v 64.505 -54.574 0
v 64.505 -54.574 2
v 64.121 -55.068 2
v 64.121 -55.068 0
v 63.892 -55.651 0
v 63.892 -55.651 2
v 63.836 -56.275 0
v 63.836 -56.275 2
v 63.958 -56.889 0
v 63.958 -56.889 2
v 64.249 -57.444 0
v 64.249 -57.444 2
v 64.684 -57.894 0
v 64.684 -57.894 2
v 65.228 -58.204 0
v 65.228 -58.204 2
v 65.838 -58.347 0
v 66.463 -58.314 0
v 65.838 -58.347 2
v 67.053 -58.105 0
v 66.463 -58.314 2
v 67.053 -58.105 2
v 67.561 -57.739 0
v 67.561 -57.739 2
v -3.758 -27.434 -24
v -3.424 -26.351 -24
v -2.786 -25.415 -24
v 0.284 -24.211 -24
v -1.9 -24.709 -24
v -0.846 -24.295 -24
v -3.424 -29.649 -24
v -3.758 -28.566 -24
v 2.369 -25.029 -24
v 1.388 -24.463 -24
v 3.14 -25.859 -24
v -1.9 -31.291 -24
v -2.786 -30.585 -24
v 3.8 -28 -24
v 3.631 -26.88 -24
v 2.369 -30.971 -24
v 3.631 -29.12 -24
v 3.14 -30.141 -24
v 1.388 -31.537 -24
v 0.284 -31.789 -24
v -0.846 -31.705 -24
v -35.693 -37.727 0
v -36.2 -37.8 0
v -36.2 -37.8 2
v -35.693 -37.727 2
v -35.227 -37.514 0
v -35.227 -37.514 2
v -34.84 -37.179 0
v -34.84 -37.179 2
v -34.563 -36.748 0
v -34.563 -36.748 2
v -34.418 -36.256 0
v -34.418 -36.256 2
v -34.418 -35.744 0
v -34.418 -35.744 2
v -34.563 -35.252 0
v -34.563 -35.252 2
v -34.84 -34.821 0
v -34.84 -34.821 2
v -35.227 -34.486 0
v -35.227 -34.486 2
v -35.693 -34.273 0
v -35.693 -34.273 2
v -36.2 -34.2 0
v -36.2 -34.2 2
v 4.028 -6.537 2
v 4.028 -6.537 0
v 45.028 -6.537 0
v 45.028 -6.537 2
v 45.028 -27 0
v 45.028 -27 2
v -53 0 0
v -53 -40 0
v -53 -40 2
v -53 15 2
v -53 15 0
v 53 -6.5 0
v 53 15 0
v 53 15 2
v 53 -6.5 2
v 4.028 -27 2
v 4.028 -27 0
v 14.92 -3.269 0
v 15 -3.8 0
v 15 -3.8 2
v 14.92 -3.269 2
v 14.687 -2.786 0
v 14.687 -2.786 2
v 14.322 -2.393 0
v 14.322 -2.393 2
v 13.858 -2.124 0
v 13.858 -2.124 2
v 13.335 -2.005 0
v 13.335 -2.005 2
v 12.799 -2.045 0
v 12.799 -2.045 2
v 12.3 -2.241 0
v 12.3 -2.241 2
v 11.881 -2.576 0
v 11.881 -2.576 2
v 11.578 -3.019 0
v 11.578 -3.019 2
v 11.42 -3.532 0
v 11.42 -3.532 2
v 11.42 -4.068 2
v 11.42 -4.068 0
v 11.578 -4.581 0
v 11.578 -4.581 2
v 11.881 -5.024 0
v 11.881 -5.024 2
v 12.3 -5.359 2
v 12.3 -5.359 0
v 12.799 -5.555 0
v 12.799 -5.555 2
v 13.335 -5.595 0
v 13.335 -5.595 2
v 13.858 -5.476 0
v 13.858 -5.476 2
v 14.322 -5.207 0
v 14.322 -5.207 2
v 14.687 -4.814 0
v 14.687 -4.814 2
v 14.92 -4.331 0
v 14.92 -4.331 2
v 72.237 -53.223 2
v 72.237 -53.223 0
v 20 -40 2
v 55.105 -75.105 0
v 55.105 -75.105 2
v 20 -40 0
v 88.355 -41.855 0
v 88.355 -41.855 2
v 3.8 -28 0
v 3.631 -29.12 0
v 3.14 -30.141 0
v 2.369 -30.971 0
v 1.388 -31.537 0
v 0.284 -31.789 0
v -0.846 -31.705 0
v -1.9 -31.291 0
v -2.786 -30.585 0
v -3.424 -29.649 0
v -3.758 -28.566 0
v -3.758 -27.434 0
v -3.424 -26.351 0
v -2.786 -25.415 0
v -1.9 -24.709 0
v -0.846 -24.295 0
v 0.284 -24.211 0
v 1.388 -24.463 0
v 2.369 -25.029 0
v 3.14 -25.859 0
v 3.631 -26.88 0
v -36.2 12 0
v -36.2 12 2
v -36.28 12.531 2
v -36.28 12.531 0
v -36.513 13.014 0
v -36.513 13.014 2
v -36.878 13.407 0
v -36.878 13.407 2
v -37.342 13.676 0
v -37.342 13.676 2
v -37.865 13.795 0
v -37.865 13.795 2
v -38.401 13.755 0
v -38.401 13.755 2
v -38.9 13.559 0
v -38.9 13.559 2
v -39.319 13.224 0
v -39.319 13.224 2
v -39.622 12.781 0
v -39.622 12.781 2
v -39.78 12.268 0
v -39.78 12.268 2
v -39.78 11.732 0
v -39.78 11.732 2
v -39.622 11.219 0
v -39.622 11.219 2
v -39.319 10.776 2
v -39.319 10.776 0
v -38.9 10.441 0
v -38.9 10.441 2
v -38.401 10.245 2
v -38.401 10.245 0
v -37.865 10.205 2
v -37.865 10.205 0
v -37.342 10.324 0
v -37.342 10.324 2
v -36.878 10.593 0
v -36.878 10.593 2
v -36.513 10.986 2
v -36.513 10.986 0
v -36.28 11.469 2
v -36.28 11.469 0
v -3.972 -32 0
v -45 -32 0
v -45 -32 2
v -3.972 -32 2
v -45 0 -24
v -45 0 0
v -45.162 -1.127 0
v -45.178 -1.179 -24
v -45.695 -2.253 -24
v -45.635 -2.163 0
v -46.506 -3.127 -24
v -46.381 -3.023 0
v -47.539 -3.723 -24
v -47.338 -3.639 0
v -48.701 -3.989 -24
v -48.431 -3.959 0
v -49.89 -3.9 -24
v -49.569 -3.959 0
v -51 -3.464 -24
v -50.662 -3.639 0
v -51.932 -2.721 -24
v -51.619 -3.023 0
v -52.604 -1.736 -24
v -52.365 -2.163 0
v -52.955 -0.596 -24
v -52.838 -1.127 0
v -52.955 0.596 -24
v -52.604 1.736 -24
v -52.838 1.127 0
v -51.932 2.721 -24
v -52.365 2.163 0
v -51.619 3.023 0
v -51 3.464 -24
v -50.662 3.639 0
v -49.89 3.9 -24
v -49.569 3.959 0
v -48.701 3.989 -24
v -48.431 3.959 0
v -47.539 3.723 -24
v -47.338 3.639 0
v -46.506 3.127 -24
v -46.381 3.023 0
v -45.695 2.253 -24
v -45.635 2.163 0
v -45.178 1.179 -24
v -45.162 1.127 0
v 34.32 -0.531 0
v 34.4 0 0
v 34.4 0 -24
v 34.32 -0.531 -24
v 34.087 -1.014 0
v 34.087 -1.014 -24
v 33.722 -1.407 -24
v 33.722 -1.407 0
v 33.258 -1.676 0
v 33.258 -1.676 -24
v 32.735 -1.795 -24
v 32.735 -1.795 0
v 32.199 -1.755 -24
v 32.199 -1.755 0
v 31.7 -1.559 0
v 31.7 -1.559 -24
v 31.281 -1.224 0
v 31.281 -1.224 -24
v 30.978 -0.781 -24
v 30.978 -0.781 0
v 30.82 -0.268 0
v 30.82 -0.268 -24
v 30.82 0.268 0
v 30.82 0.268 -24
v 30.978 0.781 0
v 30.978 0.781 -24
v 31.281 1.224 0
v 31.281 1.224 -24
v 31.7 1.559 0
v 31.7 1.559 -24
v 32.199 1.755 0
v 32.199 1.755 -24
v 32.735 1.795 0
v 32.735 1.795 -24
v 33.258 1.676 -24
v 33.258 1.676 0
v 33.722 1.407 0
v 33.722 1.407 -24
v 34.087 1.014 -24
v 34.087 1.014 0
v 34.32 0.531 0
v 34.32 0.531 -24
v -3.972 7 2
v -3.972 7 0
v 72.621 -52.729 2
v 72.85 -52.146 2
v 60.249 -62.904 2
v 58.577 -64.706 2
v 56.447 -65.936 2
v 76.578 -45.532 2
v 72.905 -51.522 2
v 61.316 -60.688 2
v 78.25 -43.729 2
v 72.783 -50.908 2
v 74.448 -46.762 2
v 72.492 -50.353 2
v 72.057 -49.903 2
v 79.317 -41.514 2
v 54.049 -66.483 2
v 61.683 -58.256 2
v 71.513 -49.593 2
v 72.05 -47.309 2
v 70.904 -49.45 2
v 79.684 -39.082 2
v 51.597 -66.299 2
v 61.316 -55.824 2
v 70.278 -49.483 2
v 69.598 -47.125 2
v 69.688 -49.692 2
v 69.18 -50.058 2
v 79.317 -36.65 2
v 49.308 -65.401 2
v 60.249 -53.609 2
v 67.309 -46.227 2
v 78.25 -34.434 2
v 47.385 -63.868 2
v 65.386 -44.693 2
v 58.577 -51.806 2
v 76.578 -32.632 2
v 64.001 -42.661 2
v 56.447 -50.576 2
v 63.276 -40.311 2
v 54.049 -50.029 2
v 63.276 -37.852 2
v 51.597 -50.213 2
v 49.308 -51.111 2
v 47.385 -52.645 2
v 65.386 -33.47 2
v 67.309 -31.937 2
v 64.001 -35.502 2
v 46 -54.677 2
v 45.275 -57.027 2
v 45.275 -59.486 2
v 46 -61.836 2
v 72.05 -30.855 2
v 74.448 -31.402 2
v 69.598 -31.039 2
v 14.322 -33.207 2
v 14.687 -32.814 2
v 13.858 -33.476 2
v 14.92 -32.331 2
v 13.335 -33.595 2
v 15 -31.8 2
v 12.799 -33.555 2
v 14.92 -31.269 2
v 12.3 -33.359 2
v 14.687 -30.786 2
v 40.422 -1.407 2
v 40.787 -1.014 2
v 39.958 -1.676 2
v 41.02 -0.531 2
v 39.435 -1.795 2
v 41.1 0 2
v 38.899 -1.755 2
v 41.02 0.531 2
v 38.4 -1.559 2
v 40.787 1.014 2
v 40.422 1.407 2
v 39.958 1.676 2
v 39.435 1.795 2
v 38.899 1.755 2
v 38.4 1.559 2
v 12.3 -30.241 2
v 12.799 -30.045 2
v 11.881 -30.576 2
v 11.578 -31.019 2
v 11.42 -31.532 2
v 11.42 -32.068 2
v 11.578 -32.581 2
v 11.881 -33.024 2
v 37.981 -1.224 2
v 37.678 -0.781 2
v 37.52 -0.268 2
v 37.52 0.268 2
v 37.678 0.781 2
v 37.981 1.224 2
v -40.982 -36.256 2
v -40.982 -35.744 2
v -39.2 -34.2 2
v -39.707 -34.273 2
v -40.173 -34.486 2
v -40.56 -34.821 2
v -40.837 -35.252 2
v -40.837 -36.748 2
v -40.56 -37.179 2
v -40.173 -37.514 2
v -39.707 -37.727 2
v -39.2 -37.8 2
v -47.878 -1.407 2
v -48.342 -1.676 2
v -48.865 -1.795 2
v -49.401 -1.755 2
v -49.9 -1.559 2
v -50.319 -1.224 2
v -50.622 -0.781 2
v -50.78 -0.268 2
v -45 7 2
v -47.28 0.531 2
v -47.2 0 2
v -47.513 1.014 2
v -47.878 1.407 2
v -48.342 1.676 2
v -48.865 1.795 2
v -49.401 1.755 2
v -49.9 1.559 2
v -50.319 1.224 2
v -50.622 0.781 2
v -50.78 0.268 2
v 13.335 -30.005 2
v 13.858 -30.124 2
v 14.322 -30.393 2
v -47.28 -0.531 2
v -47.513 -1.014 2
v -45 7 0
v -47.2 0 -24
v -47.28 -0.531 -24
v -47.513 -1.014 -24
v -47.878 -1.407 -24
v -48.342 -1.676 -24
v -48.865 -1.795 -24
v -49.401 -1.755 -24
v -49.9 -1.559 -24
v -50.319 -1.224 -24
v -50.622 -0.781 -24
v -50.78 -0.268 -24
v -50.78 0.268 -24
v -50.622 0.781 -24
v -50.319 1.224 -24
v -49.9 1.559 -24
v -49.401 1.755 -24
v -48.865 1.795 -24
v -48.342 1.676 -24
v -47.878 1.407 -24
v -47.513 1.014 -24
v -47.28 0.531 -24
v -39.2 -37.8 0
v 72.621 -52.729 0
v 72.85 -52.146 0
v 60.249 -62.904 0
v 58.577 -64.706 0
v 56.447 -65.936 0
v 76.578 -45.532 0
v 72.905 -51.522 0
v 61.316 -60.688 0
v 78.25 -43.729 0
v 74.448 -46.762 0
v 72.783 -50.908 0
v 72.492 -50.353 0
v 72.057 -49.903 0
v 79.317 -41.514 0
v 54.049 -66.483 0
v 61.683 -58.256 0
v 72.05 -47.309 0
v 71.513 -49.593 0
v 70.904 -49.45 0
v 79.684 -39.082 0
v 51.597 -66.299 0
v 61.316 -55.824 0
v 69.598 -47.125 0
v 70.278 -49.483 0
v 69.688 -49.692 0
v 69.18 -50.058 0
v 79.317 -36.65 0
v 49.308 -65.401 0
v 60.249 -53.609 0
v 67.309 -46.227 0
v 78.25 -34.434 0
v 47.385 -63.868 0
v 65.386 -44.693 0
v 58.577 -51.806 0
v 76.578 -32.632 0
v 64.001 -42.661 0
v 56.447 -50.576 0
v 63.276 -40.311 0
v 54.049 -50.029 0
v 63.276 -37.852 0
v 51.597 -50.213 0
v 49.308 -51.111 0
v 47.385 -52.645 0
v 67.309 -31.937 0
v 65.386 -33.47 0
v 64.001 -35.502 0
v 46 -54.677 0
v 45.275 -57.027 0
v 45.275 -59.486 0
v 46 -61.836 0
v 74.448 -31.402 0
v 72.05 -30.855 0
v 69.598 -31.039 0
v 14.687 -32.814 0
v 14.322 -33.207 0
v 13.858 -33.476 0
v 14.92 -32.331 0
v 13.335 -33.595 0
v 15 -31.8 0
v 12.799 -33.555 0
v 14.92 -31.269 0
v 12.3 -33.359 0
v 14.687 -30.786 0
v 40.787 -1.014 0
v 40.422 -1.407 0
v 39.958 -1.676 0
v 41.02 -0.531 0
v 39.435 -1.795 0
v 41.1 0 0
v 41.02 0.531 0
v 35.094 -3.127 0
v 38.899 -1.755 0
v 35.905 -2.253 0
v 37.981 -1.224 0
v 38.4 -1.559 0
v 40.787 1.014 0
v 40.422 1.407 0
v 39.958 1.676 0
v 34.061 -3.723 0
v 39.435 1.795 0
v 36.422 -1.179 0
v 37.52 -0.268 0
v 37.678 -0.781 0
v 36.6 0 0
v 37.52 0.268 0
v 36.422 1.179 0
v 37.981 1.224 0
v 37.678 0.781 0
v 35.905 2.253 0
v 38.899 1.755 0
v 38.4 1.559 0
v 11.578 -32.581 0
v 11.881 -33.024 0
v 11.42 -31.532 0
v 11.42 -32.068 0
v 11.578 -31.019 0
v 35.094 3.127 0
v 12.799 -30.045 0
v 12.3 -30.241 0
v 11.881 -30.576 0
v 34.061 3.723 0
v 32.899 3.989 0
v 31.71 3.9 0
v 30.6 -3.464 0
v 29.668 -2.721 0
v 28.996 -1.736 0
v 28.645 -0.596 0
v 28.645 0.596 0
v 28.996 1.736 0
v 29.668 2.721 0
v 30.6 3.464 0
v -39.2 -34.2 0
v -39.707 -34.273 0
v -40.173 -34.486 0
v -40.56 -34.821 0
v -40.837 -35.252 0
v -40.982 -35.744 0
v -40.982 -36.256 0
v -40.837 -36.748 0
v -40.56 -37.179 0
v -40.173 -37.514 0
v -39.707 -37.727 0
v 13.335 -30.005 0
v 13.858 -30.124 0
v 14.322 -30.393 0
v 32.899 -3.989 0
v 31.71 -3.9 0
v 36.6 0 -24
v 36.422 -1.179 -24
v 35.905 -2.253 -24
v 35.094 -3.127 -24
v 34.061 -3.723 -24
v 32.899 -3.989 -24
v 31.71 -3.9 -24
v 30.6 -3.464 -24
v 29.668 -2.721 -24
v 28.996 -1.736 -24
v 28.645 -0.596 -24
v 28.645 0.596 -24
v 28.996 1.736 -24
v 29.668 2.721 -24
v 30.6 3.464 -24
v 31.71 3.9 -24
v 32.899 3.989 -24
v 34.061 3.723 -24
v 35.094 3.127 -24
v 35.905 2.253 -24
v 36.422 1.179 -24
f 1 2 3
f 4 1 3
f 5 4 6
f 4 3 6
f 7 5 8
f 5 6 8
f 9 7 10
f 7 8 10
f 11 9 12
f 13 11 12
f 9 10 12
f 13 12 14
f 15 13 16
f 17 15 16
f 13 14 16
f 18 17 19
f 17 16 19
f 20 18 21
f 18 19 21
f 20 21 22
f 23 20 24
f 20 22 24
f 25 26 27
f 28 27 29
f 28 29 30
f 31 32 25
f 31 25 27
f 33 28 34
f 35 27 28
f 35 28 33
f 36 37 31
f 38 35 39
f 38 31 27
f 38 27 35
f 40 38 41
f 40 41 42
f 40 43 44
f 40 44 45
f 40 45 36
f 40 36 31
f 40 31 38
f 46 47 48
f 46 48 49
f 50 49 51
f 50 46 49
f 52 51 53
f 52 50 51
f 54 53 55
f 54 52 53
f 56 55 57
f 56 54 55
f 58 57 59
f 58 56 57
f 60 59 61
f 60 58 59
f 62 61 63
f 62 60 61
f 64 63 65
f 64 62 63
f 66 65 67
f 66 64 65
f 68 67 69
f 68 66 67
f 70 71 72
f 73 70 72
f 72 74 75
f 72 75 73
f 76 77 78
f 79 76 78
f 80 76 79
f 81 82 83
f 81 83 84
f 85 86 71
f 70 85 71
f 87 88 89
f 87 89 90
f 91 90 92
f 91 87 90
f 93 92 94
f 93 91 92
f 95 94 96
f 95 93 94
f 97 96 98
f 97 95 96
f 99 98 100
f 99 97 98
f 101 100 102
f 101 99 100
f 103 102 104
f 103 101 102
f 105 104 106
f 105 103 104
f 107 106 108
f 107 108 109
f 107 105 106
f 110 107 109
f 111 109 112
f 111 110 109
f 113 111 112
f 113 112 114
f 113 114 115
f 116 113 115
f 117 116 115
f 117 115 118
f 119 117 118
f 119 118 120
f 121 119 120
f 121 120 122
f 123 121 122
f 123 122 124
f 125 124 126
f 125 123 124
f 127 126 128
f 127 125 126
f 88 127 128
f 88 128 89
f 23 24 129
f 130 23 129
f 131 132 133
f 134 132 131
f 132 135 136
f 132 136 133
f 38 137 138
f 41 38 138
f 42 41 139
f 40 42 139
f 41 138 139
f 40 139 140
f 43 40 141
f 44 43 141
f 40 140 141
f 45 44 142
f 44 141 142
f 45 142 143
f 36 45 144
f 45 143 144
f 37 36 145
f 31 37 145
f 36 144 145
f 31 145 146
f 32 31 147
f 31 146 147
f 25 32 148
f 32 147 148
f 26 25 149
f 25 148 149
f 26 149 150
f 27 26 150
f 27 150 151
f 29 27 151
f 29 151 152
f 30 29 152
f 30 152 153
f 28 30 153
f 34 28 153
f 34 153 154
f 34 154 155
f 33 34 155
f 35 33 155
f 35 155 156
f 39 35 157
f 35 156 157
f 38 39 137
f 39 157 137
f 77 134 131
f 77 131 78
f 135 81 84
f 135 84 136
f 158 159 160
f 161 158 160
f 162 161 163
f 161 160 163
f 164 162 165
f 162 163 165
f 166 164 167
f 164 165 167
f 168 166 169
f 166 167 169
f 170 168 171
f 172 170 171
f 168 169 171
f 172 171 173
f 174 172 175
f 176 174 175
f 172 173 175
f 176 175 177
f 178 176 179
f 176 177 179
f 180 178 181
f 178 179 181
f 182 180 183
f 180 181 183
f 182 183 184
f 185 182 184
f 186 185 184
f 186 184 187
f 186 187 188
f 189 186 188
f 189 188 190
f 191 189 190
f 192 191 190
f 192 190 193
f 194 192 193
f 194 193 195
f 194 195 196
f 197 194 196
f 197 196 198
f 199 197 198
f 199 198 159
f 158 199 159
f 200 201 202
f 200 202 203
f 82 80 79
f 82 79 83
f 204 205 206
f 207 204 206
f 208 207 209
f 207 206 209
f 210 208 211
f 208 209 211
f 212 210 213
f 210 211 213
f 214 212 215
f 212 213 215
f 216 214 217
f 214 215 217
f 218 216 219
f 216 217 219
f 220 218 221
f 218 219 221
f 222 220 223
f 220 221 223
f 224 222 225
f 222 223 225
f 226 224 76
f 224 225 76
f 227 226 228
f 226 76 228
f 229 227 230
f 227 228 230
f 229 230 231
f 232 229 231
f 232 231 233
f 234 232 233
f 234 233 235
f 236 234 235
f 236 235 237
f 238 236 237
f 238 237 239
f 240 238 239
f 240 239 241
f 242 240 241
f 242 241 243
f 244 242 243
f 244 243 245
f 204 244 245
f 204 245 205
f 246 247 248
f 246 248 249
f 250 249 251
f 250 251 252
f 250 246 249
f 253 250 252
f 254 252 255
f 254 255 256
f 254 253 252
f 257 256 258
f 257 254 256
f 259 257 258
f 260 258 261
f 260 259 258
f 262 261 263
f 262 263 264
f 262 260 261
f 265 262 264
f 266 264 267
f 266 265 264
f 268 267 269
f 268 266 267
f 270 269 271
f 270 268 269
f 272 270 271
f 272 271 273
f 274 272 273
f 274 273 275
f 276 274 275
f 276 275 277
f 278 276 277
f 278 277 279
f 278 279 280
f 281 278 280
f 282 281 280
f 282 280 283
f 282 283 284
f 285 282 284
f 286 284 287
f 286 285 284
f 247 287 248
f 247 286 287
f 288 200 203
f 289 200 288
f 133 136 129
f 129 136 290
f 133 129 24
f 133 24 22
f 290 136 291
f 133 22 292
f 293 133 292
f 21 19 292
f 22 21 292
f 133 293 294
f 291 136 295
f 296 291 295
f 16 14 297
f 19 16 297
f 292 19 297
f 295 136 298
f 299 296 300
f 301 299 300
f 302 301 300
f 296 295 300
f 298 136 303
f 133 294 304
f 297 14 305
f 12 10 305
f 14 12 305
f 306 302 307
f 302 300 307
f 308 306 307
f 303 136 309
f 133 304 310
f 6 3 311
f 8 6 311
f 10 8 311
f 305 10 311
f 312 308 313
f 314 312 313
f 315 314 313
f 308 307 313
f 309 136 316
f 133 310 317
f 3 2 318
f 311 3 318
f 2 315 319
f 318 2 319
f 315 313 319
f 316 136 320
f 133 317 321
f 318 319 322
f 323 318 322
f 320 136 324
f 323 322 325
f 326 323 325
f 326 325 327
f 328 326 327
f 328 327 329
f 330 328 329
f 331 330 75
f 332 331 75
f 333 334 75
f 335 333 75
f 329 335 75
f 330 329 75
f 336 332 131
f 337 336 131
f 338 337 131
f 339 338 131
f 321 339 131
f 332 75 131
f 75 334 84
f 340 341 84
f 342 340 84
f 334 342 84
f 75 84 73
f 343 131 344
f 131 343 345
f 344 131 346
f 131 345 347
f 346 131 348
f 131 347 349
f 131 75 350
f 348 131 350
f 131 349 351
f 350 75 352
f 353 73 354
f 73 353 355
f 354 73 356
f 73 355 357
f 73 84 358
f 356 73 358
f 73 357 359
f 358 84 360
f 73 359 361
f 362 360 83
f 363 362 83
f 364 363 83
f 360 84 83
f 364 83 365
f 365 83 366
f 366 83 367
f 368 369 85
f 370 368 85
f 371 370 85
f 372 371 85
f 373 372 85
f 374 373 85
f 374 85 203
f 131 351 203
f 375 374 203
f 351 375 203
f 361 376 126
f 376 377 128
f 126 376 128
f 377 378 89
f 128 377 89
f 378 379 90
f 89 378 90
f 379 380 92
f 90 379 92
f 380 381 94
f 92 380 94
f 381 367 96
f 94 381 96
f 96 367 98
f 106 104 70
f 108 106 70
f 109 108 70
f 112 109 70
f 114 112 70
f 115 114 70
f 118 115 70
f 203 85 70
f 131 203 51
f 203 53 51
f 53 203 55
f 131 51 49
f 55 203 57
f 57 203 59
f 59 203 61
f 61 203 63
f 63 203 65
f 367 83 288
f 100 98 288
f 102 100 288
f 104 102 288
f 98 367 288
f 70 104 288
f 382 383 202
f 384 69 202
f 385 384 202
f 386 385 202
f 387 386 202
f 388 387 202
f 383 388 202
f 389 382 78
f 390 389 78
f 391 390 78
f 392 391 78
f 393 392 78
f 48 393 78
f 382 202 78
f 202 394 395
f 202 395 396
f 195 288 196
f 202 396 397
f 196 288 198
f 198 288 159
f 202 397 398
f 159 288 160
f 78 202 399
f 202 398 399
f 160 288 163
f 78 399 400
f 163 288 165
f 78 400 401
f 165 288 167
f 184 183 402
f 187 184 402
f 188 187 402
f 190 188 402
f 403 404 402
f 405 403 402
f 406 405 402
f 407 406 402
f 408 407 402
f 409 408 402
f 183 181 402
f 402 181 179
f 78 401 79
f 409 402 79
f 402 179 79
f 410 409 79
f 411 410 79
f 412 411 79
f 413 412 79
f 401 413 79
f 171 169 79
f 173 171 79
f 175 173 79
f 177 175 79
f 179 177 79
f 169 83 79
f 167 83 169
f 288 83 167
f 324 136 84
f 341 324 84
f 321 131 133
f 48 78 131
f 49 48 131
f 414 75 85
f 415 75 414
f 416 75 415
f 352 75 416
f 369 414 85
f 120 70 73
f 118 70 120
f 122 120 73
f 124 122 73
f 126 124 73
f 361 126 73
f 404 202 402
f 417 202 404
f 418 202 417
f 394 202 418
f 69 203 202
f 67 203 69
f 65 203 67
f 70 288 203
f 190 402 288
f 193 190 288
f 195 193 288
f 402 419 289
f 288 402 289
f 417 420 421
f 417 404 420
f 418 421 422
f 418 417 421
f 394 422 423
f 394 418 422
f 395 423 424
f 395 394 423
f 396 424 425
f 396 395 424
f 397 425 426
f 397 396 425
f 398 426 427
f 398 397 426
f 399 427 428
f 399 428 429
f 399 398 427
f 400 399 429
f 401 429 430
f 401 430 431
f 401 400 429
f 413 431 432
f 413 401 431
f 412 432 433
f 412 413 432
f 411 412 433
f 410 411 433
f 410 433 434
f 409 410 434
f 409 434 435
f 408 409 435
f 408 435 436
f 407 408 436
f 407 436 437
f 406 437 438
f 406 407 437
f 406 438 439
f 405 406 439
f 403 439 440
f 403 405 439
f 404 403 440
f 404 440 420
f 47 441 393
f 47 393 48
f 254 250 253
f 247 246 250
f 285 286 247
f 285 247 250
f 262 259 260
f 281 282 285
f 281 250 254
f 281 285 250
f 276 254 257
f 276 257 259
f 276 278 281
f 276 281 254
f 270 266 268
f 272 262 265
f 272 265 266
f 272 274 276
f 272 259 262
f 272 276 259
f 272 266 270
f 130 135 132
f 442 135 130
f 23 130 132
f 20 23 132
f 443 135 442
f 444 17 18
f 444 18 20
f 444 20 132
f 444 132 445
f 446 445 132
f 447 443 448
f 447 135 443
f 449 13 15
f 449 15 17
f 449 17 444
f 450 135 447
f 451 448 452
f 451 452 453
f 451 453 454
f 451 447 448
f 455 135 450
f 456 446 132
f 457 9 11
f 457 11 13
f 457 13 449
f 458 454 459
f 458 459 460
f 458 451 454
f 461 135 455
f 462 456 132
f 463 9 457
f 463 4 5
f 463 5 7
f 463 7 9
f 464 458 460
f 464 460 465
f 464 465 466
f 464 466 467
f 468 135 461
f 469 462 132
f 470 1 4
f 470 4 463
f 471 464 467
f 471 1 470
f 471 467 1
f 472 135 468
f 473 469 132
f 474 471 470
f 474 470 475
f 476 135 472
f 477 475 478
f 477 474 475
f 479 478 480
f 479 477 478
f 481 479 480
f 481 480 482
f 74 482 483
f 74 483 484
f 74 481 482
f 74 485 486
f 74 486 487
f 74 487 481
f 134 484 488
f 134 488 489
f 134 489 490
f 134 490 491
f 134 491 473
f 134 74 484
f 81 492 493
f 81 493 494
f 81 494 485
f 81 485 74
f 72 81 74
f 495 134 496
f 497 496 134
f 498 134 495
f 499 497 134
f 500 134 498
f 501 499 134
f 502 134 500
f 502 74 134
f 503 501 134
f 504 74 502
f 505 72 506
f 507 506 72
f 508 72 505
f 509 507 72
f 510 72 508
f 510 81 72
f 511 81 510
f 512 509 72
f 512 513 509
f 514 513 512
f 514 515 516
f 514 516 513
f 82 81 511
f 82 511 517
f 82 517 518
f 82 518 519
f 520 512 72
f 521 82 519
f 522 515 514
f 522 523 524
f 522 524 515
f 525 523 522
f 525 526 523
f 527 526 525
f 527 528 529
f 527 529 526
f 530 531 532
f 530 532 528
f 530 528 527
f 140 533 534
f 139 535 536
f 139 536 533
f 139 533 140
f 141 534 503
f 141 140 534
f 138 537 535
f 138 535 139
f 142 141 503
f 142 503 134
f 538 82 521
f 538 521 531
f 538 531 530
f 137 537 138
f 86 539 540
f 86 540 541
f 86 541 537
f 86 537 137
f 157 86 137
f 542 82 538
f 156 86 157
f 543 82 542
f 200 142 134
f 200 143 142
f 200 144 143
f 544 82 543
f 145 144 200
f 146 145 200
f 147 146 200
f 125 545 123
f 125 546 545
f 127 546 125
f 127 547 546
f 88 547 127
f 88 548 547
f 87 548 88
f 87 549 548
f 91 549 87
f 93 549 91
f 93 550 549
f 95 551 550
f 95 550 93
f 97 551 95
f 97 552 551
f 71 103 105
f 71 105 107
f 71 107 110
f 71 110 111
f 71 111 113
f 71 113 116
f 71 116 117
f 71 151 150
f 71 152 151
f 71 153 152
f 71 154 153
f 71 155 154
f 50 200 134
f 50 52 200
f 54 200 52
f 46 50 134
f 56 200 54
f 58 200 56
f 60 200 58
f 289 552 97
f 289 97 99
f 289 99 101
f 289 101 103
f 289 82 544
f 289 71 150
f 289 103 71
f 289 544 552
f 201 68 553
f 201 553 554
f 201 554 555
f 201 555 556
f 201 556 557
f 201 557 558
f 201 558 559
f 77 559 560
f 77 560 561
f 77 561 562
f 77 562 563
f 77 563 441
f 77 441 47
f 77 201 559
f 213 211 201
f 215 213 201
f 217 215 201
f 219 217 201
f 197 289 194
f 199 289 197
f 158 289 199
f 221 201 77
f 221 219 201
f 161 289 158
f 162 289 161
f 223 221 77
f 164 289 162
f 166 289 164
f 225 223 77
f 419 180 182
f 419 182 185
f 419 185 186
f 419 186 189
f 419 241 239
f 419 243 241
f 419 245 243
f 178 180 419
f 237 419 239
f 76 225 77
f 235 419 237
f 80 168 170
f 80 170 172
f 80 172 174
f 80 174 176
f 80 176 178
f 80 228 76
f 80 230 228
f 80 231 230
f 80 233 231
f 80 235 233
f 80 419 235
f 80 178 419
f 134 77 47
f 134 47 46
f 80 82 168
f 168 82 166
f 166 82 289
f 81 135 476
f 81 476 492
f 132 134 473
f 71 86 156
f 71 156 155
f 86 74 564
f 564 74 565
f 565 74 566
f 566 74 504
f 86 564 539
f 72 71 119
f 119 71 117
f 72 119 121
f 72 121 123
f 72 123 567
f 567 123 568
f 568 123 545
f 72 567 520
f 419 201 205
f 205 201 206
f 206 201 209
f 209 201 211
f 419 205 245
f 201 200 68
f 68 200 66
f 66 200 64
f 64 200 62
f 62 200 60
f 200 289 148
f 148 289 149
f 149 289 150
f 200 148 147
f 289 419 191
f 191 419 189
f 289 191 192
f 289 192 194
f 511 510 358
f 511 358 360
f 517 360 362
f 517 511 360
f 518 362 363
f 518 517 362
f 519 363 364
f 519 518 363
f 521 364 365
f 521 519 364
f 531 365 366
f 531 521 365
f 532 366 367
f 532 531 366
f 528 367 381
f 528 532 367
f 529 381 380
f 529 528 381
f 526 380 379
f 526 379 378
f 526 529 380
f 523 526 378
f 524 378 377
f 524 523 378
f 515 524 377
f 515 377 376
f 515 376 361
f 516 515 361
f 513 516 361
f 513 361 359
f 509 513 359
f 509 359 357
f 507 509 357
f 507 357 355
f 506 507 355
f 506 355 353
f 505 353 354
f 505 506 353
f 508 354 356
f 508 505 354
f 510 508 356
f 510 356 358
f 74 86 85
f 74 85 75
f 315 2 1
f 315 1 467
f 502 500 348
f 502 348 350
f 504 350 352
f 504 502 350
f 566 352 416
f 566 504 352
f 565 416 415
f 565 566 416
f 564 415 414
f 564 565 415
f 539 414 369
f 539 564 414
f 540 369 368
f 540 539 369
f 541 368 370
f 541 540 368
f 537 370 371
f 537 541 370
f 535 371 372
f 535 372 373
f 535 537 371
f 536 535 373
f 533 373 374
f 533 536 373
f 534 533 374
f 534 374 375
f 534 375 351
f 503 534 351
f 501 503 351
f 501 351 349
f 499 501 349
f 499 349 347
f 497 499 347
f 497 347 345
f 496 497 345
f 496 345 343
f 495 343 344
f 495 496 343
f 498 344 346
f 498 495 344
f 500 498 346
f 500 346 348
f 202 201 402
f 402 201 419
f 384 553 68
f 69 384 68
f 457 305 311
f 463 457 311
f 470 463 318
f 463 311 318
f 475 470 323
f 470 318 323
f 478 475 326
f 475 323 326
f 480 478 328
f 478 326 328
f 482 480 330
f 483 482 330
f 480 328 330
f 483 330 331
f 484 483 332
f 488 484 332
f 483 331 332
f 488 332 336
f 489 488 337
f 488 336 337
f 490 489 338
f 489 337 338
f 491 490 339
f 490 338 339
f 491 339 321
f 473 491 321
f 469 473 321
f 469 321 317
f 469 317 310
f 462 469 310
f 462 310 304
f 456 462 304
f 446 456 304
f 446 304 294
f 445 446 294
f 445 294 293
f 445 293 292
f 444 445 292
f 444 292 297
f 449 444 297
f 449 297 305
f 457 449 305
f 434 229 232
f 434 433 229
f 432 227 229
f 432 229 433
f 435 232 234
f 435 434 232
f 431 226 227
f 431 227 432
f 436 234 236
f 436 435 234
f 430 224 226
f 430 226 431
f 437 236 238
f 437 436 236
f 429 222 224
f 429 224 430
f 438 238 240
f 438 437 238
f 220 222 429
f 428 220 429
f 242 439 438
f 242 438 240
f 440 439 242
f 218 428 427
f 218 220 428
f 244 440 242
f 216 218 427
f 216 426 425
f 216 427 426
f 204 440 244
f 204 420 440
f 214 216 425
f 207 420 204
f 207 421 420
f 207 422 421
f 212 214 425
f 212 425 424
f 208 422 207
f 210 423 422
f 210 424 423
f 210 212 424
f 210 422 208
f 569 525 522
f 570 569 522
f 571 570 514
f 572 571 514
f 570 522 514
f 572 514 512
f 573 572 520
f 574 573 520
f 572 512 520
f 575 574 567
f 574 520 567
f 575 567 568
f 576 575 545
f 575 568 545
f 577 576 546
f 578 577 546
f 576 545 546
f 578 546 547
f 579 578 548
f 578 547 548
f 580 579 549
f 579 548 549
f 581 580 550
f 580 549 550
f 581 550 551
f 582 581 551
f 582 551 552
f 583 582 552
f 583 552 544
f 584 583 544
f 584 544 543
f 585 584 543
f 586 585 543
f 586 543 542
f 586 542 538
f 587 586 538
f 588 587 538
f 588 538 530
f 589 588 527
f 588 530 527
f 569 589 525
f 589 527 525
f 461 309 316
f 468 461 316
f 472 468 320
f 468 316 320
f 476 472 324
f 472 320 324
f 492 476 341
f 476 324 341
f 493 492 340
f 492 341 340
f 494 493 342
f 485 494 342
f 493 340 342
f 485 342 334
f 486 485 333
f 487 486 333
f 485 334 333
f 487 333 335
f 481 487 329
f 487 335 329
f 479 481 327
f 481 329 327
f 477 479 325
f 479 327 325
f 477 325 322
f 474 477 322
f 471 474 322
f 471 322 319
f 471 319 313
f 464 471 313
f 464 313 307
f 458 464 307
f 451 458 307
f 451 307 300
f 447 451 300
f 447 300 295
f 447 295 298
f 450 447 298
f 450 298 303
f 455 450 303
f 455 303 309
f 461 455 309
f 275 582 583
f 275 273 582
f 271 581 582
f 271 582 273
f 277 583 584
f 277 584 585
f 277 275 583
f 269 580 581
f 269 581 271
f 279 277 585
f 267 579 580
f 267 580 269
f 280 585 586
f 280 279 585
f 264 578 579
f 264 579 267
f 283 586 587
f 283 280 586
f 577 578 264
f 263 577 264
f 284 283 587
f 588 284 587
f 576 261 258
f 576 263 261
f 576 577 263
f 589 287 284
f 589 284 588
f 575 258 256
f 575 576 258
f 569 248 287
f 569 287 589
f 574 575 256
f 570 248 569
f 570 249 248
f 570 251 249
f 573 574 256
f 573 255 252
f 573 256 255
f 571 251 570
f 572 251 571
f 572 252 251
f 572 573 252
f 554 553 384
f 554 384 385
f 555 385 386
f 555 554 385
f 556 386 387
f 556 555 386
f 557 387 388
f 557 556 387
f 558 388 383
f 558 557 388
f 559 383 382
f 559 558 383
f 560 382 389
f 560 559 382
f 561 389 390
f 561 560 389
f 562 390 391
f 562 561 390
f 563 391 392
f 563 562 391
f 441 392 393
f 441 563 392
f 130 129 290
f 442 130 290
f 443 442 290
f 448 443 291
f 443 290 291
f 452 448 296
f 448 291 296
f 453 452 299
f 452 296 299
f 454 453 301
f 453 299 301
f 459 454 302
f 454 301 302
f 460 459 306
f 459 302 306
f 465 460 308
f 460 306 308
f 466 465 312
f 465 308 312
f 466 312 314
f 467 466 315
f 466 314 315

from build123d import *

# Parameters (mm, degrees)
SKETCH_R        = 1.8
SKETCH_W        = 41.028241
SKETCH_H        = 39
SKETCH_W_2      = 41
SKETCH_H_2      = 20.463
PAD_DEPTH       = 2
SKETCH001_R     = 3.8
SKETCH001_R_2   = 4
SKETCH001_R_3   = 1.8
PAD001_DEPTH    = 24
SKETCH002_R     = 8.25
POCKET_DEPTH    = 5
SKETCH003_R     = 1.8
POCKET001_DEPTH = 5


with BuildPart() as part:
    # Sketch → Pad (new body)
    with BuildSketch(Plane.XY):
        Polygon((-53, 15), (53, 15), (53, -6.5), (88.355343, -41.855343), (55.105343, -75.105343), (20, -40), (-53, -40), align=None)
        with Locations((-49, 0)):
            Circle(SKETCH_R, mode=Mode.SUBTRACT)
        with Locations((39.3, 0)):
            Circle(SKETCH_R, mode=Mode.SUBTRACT)
        with Locations((13.2, -31.8)):
            Circle(SKETCH_R, mode=Mode.SUBTRACT)
        with Locations((13.2, -3.8)):
            Circle(SKETCH_R, mode=Mode.SUBTRACT)
        with Locations((-24.485879, -12.5)):
            Rectangle(SKETCH_W, SKETCH_H, mode=Mode.SUBTRACT)
        with Locations((24.528241, -16.768476)):
            Rectangle(SKETCH_W_2, SKETCH_H_2, mode=Mode.SUBTRACT)
        with BuildLine():
            ThreePointArc((-39.199998, -34.2), (-41, -36), (-39.199998, -37.8))
            Line((-39.199998, -37.8), (-36.200009, -37.8))
            ThreePointArc((-36.200009, -37.8), (-34.4, -36.000004), (-36.2, -34.2))
            Line((-39.199998, -34.2), (-36.2, -34.2))
        make_face(mode=Mode.SUBTRACT)
    extrude(amount=PAD_DEPTH)

    # Sketch001 → Pad001 (new body)
    with BuildSketch(Plane(origin=(0, 0, 0), x_dir=(1, 0, 0), z_dir=(0, 0, -1))):
        with Locations((0, 28)):
            Circle(SKETCH001_R)
        with Locations((-49, 0)):
            Circle(SKETCH001_R_2)
        with Locations((-49, 0)):
            Circle(SKETCH001_R_3, mode=Mode.SUBTRACT)
        with Locations((32.6, 0)):
            Circle(SKETCH001_R_2)
        with Locations((32.6, 0)):
            Circle(SKETCH001_R_3, mode=Mode.SUBTRACT)
    extrude(amount=PAD001_DEPTH)

    # Sketch002 → Pocket (cut)
    with BuildSketch(Plane.XY.offset(2)):
        with Locations((53.4328, -58.256155)):
            Circle(SKETCH002_R)
        with Locations((71.433789, -39.081839)):
            Circle(SKETCH002_R)
        with BuildLine():
            ThreePointArc((64.504552, -54.573607), (64.450253, -57.684403), (67.561049, -57.738702))
            Line((67.561049, -57.738702), (72.236758, -53.223423))
            ThreePointArc((72.236758, -53.223423), (72.291056, -50.112627), (69.18026, -50.058329))
            Line((64.504552, -54.573607), (69.18026, -50.058329))
        make_face()
    extrude(amount=-POCKET_DEPTH, mode=Mode.SUBTRACT)

    # Sketch003 → Pocket001 (cut)
    with BuildSketch(Plane.XY.offset(2)):
        with Locations((-38, 12)):
            Circle(SKETCH003_R)
    extrude(amount=-POCKET001_DEPTH, mode=Mode.SUBTRACT)


solid = part.part
